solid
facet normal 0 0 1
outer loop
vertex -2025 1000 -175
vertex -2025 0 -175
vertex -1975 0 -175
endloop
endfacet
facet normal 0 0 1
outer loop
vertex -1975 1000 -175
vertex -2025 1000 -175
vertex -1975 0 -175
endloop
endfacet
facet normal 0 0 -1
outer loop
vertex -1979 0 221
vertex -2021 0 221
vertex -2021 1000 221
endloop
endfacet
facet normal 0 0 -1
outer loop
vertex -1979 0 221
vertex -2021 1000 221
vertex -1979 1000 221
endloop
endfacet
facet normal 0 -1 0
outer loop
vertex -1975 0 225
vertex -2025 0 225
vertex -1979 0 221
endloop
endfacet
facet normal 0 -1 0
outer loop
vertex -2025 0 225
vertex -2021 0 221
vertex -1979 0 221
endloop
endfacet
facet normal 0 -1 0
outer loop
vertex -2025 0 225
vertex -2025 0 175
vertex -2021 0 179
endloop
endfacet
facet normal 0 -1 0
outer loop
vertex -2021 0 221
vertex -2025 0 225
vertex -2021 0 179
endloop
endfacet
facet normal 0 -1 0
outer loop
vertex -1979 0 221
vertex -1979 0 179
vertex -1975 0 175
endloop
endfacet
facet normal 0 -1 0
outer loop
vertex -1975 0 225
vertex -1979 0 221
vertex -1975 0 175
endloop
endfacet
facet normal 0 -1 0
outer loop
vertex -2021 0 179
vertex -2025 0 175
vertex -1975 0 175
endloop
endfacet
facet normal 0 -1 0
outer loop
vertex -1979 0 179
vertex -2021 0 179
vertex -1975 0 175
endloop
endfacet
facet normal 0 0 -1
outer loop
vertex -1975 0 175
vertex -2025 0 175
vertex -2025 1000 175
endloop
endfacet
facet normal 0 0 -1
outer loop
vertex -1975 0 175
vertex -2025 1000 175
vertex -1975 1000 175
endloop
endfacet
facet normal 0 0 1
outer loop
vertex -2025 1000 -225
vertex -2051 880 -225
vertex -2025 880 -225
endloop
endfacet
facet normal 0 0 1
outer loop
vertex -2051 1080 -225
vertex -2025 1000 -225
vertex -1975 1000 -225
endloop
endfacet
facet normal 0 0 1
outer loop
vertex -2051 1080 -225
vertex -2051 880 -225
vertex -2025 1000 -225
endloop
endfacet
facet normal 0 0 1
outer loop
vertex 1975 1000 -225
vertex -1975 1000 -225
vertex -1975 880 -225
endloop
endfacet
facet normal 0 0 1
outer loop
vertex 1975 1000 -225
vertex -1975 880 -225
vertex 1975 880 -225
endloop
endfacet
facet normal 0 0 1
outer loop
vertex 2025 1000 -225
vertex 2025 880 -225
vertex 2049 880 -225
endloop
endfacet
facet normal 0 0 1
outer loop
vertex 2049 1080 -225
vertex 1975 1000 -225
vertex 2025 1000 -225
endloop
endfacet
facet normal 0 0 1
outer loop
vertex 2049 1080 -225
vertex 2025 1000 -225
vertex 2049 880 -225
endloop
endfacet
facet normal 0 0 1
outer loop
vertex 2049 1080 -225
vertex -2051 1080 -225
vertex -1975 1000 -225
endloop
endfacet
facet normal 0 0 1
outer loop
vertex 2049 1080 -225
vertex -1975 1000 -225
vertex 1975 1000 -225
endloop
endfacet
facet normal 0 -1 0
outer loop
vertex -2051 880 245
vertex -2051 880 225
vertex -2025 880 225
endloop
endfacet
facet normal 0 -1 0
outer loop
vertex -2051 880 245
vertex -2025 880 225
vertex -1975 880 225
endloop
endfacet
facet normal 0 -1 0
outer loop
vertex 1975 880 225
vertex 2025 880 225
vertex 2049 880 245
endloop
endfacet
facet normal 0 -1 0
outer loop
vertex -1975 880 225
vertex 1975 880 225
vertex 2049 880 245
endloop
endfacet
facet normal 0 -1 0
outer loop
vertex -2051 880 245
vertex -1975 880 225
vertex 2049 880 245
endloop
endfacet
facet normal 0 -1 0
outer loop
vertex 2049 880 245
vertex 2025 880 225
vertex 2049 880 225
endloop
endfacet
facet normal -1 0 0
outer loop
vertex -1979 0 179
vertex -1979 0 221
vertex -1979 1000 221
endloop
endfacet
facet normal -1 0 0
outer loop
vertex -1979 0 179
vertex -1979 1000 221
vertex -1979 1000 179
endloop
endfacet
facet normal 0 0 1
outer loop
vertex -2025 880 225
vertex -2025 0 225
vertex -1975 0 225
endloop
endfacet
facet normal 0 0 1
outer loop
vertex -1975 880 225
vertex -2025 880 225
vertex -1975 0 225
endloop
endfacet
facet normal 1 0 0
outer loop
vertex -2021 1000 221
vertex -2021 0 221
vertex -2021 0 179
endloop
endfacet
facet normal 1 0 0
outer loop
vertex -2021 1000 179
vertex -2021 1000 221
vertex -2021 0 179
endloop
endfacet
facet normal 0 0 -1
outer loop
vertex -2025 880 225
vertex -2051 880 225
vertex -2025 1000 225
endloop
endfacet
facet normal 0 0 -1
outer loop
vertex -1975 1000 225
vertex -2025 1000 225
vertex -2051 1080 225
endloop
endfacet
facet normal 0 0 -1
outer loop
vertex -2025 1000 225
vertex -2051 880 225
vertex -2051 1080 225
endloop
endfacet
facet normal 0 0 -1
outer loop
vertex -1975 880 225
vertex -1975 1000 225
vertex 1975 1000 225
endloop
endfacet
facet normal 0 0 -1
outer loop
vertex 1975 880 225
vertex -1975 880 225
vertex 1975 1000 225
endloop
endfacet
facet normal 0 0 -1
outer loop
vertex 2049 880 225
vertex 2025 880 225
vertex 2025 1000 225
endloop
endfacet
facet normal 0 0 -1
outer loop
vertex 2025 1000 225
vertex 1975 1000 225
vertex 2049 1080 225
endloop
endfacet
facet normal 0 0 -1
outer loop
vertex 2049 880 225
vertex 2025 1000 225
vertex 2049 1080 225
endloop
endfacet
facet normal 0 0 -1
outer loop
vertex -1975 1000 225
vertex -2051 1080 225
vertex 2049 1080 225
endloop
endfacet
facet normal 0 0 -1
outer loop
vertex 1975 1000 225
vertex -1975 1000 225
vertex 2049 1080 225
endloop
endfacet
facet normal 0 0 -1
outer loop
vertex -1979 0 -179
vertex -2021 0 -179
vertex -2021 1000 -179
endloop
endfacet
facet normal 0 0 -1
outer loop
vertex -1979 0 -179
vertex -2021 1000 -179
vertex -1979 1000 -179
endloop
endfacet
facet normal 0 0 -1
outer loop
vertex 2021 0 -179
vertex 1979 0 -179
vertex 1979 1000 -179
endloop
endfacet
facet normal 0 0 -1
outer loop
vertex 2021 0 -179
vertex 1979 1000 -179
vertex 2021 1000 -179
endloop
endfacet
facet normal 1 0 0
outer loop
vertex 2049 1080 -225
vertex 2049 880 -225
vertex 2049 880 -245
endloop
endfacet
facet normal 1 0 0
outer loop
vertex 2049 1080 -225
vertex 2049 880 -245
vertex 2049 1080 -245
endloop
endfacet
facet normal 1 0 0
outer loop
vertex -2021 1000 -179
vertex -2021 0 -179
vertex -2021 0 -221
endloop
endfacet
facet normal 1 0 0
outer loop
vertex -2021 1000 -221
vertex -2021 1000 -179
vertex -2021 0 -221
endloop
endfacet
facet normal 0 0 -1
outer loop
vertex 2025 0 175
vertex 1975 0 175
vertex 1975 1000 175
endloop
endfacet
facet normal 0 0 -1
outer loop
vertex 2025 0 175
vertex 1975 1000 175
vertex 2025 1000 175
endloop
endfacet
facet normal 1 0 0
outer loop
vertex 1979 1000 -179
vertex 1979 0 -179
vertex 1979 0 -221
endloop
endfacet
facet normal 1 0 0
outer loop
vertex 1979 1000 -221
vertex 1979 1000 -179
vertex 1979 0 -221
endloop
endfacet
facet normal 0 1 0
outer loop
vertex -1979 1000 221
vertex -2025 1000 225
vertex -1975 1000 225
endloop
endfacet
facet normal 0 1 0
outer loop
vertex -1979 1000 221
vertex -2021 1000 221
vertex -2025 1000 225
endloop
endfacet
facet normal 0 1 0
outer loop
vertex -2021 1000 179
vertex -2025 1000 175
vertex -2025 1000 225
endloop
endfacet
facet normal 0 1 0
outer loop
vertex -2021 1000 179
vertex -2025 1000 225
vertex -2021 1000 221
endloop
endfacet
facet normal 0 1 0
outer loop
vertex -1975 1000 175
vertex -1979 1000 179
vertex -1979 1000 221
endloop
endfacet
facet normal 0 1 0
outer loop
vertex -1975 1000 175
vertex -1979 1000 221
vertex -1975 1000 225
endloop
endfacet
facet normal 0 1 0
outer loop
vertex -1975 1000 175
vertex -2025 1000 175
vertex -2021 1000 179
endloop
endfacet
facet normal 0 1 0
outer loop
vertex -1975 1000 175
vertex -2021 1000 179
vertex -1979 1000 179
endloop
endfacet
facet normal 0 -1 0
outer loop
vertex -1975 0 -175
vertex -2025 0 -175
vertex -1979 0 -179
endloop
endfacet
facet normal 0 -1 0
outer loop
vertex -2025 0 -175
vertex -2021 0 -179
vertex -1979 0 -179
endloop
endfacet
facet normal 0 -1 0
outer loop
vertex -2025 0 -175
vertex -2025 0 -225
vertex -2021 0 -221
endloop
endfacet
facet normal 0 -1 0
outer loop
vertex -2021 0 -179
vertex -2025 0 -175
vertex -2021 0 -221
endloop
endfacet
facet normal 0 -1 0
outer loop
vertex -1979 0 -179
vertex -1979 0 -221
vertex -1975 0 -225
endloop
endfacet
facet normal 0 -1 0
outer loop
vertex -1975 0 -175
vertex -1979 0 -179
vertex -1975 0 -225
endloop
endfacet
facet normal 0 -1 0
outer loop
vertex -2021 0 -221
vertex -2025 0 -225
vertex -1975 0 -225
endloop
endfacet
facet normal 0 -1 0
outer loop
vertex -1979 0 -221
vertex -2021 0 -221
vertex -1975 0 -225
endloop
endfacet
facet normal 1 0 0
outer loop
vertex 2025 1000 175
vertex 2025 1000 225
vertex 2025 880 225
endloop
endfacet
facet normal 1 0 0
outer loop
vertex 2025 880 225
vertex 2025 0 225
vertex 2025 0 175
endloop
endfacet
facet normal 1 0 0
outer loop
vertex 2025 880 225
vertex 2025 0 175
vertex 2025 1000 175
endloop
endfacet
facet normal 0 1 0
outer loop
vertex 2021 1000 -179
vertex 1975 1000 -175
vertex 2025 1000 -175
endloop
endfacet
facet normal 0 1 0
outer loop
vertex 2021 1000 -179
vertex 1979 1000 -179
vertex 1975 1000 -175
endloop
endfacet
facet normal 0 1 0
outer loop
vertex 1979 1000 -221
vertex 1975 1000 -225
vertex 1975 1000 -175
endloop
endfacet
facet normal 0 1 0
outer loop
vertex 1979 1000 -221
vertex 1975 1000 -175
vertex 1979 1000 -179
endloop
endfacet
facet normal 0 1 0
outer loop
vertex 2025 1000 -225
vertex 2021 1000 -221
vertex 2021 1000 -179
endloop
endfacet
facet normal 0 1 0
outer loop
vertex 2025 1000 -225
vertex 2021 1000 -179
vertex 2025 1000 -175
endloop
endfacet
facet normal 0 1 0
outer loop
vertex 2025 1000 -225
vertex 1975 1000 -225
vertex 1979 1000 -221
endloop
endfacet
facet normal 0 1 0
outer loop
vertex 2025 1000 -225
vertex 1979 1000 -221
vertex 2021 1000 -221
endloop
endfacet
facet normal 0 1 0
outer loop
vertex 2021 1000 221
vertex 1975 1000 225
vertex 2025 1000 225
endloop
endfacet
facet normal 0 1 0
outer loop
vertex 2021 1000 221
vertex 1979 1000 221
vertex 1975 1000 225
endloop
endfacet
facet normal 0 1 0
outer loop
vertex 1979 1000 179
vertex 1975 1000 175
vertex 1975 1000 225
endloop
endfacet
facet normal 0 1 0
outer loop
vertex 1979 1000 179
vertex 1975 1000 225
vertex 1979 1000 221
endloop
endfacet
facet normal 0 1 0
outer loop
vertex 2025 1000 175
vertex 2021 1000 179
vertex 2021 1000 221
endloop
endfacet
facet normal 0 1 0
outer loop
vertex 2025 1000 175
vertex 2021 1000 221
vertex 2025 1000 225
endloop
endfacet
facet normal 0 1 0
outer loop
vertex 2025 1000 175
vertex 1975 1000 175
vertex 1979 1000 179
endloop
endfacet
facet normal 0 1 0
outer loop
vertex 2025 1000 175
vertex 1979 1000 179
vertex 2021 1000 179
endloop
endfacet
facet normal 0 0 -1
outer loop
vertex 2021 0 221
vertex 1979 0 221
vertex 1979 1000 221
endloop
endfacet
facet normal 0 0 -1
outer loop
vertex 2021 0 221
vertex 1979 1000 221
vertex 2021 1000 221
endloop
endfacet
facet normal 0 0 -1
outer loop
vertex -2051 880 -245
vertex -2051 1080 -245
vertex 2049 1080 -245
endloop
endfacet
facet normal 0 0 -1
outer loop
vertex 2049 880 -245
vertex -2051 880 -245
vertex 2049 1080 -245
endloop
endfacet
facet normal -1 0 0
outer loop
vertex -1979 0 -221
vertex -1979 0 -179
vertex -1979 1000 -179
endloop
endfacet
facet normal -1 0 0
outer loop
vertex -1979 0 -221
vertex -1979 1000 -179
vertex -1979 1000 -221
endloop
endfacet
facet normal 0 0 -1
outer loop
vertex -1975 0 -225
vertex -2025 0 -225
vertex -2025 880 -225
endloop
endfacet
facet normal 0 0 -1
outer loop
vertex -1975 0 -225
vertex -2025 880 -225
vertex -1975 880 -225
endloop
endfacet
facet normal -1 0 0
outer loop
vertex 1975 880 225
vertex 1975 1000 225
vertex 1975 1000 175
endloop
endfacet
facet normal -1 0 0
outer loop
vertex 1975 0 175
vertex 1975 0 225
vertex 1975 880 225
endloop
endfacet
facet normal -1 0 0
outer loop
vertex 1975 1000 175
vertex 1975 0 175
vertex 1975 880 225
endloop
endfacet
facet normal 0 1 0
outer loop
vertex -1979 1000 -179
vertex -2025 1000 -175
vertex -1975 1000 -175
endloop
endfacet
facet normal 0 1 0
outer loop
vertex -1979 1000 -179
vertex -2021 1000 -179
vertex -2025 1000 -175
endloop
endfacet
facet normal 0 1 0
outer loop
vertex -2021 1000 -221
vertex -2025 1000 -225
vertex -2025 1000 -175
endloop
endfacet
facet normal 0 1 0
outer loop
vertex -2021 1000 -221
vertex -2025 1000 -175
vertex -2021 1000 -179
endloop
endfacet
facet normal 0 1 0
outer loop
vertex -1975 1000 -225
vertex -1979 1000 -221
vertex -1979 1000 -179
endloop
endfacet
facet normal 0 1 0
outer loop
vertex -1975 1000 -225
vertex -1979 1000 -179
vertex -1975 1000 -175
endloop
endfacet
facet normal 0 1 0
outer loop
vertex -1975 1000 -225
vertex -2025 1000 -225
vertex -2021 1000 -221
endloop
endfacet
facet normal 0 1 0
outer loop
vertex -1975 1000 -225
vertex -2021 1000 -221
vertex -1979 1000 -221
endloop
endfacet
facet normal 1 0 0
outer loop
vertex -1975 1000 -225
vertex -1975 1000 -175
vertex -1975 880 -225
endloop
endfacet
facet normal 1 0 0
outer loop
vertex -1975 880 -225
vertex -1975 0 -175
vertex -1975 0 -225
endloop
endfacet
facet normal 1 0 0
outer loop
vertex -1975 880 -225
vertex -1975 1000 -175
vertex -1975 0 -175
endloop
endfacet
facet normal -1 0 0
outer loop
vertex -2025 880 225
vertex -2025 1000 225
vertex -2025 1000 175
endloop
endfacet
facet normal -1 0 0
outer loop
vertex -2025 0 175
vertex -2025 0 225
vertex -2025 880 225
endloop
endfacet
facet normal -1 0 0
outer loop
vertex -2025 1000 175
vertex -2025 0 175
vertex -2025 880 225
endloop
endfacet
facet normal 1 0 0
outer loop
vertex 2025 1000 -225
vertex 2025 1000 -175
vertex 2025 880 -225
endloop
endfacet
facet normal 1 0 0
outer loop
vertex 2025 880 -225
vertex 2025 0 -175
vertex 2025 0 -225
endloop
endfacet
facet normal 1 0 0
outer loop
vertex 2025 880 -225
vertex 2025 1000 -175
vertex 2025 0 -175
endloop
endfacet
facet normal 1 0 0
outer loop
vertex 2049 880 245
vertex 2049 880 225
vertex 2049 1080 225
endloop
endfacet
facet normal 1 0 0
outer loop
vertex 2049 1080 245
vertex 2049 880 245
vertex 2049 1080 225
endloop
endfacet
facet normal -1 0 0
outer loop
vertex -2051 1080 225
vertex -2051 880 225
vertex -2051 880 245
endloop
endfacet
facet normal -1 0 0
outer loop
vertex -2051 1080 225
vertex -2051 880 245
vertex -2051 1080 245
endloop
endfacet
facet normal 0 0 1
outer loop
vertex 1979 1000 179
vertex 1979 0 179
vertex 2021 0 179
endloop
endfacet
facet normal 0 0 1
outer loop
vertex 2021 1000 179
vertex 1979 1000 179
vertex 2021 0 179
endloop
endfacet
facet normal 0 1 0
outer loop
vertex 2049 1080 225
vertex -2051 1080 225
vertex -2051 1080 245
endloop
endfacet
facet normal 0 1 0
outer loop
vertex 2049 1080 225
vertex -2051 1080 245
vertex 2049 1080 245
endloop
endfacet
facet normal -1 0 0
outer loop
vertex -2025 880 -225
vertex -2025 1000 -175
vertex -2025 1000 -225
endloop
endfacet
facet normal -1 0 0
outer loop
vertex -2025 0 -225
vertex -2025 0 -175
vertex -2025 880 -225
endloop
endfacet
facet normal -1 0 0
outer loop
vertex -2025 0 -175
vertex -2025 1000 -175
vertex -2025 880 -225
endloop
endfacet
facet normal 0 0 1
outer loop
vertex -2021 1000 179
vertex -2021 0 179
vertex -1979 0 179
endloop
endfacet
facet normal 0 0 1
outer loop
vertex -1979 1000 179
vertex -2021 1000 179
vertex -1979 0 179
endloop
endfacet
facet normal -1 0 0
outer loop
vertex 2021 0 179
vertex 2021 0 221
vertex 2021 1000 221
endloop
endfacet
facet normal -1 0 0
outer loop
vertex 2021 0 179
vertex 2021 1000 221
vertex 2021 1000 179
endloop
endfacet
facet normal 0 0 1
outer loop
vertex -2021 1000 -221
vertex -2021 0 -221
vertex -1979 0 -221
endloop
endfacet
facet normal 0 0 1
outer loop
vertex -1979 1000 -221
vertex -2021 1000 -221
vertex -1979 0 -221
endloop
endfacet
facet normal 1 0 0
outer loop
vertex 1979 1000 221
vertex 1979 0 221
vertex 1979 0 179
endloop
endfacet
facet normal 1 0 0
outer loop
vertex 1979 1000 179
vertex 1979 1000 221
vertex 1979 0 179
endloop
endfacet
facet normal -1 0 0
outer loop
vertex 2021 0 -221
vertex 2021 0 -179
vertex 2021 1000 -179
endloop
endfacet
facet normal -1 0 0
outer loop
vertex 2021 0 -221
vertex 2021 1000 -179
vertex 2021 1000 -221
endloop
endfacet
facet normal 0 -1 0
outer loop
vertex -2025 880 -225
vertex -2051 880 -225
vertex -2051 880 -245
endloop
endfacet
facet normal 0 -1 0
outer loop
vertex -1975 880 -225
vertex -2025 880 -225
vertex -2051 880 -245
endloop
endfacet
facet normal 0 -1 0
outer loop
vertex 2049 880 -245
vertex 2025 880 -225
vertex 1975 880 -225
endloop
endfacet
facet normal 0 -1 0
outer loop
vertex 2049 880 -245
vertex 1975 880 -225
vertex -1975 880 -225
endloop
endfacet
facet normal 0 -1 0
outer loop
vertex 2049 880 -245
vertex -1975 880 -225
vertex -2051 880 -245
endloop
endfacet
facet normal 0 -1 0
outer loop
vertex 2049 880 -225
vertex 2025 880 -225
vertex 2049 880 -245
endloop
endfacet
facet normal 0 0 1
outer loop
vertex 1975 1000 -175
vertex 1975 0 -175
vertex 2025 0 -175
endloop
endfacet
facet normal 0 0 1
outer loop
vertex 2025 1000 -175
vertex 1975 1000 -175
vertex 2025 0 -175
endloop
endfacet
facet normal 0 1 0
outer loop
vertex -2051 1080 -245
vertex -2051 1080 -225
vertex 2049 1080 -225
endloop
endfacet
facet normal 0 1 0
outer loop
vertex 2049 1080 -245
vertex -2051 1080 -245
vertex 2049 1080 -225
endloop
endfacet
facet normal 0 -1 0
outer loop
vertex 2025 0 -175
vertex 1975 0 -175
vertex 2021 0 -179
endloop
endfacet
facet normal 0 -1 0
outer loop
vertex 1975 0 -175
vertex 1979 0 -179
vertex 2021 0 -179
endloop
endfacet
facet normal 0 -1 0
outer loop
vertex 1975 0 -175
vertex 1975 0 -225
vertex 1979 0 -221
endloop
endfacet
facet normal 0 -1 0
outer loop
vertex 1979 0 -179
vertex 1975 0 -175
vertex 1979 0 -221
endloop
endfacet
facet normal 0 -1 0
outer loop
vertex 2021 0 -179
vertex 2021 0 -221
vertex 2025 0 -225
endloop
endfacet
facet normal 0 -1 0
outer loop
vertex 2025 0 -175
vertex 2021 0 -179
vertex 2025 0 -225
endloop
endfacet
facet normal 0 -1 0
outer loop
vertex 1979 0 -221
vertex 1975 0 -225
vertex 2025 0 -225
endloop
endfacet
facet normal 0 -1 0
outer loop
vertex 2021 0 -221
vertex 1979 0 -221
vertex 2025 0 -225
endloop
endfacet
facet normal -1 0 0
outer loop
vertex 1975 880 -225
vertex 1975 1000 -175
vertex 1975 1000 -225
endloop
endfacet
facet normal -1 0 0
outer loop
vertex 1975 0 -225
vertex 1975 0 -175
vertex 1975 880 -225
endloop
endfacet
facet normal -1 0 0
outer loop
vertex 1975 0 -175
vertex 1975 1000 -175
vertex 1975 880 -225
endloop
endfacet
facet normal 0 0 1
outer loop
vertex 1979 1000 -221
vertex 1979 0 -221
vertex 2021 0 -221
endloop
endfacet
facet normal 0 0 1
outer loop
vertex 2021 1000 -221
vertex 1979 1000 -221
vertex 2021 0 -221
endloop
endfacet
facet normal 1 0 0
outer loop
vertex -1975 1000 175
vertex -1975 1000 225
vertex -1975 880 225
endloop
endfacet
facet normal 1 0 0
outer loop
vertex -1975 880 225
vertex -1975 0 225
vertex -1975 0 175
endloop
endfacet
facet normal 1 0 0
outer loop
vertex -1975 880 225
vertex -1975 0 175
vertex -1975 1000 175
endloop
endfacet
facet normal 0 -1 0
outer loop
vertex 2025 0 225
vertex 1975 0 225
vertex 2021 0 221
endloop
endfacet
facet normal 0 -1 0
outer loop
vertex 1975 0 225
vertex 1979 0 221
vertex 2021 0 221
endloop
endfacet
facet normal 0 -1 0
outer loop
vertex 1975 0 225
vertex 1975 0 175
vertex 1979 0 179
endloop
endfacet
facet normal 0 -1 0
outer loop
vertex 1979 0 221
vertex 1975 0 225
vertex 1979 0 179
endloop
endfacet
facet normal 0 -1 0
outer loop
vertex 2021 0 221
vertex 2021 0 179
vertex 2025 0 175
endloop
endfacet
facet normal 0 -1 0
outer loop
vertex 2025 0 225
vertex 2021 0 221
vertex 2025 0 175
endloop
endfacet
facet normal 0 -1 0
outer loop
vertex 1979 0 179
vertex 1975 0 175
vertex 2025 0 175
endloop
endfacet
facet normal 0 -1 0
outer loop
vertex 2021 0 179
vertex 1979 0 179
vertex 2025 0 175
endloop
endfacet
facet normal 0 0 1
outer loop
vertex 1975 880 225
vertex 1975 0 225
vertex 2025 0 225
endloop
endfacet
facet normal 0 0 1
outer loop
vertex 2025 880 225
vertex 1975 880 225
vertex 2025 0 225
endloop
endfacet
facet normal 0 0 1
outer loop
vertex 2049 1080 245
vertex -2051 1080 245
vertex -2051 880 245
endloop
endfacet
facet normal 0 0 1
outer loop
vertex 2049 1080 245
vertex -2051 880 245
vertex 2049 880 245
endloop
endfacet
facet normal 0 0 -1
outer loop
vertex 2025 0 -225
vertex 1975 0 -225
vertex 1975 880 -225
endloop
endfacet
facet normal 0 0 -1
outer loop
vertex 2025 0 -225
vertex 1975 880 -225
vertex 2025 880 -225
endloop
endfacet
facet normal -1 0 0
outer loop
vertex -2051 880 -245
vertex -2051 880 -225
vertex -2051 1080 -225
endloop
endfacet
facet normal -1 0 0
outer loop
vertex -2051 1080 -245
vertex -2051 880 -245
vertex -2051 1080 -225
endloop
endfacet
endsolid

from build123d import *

# Parameters (mm, degrees)
SKIZZE2_W                         = 50
SKIZZE2_H                         = 50
SKIZZE2_W_2                       = 42
SKIZZE2_H_2                       = 42
AUFSATZ_LINEAR_AUSTRAGEN1_DEPTH   = 1000
AUFSATZ_LINEAR_AUSTRAGEN1_2_DEPTH = 1000
AUFSATZ_LINEAR_AUSTRAGEN1_3_DEPTH = 1000
AUFSATZ_LINEAR_AUSTRAGEN1_4_DEPTH = 1000
SKIZZE3_W                         = 4100
SKIZZE3_H                         = 200
AUFSATZ_LINEAR_AUSTRAGEN2_DEPTH   = 20
SKIZZE4_W                         = 4100
SKIZZE4_H                         = 200
AUFSATZ_LINEAR_AUSTRAGEN3_DEPTH   = 20


with BuildPart() as part:
    # Skizze2 → Aufsatz-Linear austragen1 (new body)
    with BuildSketch(Plane(origin=(0, 0, 0), x_dir=(1, 0, 0), z_dir=(0, 1, 0))):
        with Locations((-2000, 200)):
            Rectangle(SKIZZE2_W, SKIZZE2_H)
        with Locations((-2000, 200)):
            Rectangle(SKIZZE2_W_2, SKIZZE2_H_2, mode=Mode.SUBTRACT)
    extrude(amount=AUFSATZ_LINEAR_AUSTRAGEN1_DEPTH)



with BuildPart() as body_2:
    # Skizze2 → Aufsatz-Linear austragen1 2 (new body)
    with BuildSketch(Plane(origin=(0, 0, 0), x_dir=(1, 0, 0), z_dir=(0, 1, 0))):
        with Locations((-2000, -200)):
            Rectangle(SKIZZE2_W, SKIZZE2_H)
        with Locations((-2000, -200)):
            Rectangle(SKIZZE2_W_2, SKIZZE2_H_2, mode=Mode.SUBTRACT)
    extrude(amount=AUFSATZ_LINEAR_AUSTRAGEN1_2_DEPTH)



with BuildPart() as body_3:
    # Skizze2 → Aufsatz-Linear austragen1 3 (new body)
    with BuildSketch(Plane(origin=(0, 0, 0), x_dir=(1, 0, 0), z_dir=(0, 1, 0))):
        with Locations((2000, -200)):
            Rectangle(SKIZZE2_W, SKIZZE2_H)
        with Locations((2000, -200)):
            Rectangle(SKIZZE2_W_2, SKIZZE2_H_2, mode=Mode.SUBTRACT)
    extrude(amount=AUFSATZ_LINEAR_AUSTRAGEN1_3_DEPTH)


with BuildPart() as body_4:
    # Skizze2 → Aufsatz-Linear austragen1 4 (new body)
    with BuildSketch(Plane(origin=(0, 0, 0), x_dir=(1, 0, 0), z_dir=(0, 1, 0))):
        with Locations((2000, 200)):
            Rectangle(SKIZZE2_W, SKIZZE2_H)
        with Locations((2000, 200)):
            Rectangle(SKIZZE2_W_2, SKIZZE2_H_2, mode=Mode.SUBTRACT)
    extrude(amount=AUFSATZ_LINEAR_AUSTRAGEN1_4_DEPTH)


with BuildPart() as body_2_1:
    add(body_2.part)

    add(body_3.part)  # Aufsatz-Linear austragen2 merges body 3
    # Skizze3 → Aufsatz-Linear austragen2 (add)
    with BuildSketch(Plane.XY.offset(225)):
        with Locations((-1, 980)):
            Rectangle(SKIZZE3_W, SKIZZE3_H)
    extrude(amount=AUFSATZ_LINEAR_AUSTRAGEN2_DEPTH)


with BuildPart() as part_1:
    add(part.part)

    add(body_4.part)  # Aufsatz-Linear austragen3 merges body 4
    # Skizze4 → Aufsatz-Linear austragen3 (add)
    with BuildSketch(Plane.XY.offset(-225)):
        with Locations((-1, 980)):
            Rectangle(SKIZZE4_W, SKIZZE4_H)
    extrude(amount=-AUFSATZ_LINEAR_AUSTRAGEN3_DEPTH)


solid = Compound([body_2_1.part, part_1.part])
